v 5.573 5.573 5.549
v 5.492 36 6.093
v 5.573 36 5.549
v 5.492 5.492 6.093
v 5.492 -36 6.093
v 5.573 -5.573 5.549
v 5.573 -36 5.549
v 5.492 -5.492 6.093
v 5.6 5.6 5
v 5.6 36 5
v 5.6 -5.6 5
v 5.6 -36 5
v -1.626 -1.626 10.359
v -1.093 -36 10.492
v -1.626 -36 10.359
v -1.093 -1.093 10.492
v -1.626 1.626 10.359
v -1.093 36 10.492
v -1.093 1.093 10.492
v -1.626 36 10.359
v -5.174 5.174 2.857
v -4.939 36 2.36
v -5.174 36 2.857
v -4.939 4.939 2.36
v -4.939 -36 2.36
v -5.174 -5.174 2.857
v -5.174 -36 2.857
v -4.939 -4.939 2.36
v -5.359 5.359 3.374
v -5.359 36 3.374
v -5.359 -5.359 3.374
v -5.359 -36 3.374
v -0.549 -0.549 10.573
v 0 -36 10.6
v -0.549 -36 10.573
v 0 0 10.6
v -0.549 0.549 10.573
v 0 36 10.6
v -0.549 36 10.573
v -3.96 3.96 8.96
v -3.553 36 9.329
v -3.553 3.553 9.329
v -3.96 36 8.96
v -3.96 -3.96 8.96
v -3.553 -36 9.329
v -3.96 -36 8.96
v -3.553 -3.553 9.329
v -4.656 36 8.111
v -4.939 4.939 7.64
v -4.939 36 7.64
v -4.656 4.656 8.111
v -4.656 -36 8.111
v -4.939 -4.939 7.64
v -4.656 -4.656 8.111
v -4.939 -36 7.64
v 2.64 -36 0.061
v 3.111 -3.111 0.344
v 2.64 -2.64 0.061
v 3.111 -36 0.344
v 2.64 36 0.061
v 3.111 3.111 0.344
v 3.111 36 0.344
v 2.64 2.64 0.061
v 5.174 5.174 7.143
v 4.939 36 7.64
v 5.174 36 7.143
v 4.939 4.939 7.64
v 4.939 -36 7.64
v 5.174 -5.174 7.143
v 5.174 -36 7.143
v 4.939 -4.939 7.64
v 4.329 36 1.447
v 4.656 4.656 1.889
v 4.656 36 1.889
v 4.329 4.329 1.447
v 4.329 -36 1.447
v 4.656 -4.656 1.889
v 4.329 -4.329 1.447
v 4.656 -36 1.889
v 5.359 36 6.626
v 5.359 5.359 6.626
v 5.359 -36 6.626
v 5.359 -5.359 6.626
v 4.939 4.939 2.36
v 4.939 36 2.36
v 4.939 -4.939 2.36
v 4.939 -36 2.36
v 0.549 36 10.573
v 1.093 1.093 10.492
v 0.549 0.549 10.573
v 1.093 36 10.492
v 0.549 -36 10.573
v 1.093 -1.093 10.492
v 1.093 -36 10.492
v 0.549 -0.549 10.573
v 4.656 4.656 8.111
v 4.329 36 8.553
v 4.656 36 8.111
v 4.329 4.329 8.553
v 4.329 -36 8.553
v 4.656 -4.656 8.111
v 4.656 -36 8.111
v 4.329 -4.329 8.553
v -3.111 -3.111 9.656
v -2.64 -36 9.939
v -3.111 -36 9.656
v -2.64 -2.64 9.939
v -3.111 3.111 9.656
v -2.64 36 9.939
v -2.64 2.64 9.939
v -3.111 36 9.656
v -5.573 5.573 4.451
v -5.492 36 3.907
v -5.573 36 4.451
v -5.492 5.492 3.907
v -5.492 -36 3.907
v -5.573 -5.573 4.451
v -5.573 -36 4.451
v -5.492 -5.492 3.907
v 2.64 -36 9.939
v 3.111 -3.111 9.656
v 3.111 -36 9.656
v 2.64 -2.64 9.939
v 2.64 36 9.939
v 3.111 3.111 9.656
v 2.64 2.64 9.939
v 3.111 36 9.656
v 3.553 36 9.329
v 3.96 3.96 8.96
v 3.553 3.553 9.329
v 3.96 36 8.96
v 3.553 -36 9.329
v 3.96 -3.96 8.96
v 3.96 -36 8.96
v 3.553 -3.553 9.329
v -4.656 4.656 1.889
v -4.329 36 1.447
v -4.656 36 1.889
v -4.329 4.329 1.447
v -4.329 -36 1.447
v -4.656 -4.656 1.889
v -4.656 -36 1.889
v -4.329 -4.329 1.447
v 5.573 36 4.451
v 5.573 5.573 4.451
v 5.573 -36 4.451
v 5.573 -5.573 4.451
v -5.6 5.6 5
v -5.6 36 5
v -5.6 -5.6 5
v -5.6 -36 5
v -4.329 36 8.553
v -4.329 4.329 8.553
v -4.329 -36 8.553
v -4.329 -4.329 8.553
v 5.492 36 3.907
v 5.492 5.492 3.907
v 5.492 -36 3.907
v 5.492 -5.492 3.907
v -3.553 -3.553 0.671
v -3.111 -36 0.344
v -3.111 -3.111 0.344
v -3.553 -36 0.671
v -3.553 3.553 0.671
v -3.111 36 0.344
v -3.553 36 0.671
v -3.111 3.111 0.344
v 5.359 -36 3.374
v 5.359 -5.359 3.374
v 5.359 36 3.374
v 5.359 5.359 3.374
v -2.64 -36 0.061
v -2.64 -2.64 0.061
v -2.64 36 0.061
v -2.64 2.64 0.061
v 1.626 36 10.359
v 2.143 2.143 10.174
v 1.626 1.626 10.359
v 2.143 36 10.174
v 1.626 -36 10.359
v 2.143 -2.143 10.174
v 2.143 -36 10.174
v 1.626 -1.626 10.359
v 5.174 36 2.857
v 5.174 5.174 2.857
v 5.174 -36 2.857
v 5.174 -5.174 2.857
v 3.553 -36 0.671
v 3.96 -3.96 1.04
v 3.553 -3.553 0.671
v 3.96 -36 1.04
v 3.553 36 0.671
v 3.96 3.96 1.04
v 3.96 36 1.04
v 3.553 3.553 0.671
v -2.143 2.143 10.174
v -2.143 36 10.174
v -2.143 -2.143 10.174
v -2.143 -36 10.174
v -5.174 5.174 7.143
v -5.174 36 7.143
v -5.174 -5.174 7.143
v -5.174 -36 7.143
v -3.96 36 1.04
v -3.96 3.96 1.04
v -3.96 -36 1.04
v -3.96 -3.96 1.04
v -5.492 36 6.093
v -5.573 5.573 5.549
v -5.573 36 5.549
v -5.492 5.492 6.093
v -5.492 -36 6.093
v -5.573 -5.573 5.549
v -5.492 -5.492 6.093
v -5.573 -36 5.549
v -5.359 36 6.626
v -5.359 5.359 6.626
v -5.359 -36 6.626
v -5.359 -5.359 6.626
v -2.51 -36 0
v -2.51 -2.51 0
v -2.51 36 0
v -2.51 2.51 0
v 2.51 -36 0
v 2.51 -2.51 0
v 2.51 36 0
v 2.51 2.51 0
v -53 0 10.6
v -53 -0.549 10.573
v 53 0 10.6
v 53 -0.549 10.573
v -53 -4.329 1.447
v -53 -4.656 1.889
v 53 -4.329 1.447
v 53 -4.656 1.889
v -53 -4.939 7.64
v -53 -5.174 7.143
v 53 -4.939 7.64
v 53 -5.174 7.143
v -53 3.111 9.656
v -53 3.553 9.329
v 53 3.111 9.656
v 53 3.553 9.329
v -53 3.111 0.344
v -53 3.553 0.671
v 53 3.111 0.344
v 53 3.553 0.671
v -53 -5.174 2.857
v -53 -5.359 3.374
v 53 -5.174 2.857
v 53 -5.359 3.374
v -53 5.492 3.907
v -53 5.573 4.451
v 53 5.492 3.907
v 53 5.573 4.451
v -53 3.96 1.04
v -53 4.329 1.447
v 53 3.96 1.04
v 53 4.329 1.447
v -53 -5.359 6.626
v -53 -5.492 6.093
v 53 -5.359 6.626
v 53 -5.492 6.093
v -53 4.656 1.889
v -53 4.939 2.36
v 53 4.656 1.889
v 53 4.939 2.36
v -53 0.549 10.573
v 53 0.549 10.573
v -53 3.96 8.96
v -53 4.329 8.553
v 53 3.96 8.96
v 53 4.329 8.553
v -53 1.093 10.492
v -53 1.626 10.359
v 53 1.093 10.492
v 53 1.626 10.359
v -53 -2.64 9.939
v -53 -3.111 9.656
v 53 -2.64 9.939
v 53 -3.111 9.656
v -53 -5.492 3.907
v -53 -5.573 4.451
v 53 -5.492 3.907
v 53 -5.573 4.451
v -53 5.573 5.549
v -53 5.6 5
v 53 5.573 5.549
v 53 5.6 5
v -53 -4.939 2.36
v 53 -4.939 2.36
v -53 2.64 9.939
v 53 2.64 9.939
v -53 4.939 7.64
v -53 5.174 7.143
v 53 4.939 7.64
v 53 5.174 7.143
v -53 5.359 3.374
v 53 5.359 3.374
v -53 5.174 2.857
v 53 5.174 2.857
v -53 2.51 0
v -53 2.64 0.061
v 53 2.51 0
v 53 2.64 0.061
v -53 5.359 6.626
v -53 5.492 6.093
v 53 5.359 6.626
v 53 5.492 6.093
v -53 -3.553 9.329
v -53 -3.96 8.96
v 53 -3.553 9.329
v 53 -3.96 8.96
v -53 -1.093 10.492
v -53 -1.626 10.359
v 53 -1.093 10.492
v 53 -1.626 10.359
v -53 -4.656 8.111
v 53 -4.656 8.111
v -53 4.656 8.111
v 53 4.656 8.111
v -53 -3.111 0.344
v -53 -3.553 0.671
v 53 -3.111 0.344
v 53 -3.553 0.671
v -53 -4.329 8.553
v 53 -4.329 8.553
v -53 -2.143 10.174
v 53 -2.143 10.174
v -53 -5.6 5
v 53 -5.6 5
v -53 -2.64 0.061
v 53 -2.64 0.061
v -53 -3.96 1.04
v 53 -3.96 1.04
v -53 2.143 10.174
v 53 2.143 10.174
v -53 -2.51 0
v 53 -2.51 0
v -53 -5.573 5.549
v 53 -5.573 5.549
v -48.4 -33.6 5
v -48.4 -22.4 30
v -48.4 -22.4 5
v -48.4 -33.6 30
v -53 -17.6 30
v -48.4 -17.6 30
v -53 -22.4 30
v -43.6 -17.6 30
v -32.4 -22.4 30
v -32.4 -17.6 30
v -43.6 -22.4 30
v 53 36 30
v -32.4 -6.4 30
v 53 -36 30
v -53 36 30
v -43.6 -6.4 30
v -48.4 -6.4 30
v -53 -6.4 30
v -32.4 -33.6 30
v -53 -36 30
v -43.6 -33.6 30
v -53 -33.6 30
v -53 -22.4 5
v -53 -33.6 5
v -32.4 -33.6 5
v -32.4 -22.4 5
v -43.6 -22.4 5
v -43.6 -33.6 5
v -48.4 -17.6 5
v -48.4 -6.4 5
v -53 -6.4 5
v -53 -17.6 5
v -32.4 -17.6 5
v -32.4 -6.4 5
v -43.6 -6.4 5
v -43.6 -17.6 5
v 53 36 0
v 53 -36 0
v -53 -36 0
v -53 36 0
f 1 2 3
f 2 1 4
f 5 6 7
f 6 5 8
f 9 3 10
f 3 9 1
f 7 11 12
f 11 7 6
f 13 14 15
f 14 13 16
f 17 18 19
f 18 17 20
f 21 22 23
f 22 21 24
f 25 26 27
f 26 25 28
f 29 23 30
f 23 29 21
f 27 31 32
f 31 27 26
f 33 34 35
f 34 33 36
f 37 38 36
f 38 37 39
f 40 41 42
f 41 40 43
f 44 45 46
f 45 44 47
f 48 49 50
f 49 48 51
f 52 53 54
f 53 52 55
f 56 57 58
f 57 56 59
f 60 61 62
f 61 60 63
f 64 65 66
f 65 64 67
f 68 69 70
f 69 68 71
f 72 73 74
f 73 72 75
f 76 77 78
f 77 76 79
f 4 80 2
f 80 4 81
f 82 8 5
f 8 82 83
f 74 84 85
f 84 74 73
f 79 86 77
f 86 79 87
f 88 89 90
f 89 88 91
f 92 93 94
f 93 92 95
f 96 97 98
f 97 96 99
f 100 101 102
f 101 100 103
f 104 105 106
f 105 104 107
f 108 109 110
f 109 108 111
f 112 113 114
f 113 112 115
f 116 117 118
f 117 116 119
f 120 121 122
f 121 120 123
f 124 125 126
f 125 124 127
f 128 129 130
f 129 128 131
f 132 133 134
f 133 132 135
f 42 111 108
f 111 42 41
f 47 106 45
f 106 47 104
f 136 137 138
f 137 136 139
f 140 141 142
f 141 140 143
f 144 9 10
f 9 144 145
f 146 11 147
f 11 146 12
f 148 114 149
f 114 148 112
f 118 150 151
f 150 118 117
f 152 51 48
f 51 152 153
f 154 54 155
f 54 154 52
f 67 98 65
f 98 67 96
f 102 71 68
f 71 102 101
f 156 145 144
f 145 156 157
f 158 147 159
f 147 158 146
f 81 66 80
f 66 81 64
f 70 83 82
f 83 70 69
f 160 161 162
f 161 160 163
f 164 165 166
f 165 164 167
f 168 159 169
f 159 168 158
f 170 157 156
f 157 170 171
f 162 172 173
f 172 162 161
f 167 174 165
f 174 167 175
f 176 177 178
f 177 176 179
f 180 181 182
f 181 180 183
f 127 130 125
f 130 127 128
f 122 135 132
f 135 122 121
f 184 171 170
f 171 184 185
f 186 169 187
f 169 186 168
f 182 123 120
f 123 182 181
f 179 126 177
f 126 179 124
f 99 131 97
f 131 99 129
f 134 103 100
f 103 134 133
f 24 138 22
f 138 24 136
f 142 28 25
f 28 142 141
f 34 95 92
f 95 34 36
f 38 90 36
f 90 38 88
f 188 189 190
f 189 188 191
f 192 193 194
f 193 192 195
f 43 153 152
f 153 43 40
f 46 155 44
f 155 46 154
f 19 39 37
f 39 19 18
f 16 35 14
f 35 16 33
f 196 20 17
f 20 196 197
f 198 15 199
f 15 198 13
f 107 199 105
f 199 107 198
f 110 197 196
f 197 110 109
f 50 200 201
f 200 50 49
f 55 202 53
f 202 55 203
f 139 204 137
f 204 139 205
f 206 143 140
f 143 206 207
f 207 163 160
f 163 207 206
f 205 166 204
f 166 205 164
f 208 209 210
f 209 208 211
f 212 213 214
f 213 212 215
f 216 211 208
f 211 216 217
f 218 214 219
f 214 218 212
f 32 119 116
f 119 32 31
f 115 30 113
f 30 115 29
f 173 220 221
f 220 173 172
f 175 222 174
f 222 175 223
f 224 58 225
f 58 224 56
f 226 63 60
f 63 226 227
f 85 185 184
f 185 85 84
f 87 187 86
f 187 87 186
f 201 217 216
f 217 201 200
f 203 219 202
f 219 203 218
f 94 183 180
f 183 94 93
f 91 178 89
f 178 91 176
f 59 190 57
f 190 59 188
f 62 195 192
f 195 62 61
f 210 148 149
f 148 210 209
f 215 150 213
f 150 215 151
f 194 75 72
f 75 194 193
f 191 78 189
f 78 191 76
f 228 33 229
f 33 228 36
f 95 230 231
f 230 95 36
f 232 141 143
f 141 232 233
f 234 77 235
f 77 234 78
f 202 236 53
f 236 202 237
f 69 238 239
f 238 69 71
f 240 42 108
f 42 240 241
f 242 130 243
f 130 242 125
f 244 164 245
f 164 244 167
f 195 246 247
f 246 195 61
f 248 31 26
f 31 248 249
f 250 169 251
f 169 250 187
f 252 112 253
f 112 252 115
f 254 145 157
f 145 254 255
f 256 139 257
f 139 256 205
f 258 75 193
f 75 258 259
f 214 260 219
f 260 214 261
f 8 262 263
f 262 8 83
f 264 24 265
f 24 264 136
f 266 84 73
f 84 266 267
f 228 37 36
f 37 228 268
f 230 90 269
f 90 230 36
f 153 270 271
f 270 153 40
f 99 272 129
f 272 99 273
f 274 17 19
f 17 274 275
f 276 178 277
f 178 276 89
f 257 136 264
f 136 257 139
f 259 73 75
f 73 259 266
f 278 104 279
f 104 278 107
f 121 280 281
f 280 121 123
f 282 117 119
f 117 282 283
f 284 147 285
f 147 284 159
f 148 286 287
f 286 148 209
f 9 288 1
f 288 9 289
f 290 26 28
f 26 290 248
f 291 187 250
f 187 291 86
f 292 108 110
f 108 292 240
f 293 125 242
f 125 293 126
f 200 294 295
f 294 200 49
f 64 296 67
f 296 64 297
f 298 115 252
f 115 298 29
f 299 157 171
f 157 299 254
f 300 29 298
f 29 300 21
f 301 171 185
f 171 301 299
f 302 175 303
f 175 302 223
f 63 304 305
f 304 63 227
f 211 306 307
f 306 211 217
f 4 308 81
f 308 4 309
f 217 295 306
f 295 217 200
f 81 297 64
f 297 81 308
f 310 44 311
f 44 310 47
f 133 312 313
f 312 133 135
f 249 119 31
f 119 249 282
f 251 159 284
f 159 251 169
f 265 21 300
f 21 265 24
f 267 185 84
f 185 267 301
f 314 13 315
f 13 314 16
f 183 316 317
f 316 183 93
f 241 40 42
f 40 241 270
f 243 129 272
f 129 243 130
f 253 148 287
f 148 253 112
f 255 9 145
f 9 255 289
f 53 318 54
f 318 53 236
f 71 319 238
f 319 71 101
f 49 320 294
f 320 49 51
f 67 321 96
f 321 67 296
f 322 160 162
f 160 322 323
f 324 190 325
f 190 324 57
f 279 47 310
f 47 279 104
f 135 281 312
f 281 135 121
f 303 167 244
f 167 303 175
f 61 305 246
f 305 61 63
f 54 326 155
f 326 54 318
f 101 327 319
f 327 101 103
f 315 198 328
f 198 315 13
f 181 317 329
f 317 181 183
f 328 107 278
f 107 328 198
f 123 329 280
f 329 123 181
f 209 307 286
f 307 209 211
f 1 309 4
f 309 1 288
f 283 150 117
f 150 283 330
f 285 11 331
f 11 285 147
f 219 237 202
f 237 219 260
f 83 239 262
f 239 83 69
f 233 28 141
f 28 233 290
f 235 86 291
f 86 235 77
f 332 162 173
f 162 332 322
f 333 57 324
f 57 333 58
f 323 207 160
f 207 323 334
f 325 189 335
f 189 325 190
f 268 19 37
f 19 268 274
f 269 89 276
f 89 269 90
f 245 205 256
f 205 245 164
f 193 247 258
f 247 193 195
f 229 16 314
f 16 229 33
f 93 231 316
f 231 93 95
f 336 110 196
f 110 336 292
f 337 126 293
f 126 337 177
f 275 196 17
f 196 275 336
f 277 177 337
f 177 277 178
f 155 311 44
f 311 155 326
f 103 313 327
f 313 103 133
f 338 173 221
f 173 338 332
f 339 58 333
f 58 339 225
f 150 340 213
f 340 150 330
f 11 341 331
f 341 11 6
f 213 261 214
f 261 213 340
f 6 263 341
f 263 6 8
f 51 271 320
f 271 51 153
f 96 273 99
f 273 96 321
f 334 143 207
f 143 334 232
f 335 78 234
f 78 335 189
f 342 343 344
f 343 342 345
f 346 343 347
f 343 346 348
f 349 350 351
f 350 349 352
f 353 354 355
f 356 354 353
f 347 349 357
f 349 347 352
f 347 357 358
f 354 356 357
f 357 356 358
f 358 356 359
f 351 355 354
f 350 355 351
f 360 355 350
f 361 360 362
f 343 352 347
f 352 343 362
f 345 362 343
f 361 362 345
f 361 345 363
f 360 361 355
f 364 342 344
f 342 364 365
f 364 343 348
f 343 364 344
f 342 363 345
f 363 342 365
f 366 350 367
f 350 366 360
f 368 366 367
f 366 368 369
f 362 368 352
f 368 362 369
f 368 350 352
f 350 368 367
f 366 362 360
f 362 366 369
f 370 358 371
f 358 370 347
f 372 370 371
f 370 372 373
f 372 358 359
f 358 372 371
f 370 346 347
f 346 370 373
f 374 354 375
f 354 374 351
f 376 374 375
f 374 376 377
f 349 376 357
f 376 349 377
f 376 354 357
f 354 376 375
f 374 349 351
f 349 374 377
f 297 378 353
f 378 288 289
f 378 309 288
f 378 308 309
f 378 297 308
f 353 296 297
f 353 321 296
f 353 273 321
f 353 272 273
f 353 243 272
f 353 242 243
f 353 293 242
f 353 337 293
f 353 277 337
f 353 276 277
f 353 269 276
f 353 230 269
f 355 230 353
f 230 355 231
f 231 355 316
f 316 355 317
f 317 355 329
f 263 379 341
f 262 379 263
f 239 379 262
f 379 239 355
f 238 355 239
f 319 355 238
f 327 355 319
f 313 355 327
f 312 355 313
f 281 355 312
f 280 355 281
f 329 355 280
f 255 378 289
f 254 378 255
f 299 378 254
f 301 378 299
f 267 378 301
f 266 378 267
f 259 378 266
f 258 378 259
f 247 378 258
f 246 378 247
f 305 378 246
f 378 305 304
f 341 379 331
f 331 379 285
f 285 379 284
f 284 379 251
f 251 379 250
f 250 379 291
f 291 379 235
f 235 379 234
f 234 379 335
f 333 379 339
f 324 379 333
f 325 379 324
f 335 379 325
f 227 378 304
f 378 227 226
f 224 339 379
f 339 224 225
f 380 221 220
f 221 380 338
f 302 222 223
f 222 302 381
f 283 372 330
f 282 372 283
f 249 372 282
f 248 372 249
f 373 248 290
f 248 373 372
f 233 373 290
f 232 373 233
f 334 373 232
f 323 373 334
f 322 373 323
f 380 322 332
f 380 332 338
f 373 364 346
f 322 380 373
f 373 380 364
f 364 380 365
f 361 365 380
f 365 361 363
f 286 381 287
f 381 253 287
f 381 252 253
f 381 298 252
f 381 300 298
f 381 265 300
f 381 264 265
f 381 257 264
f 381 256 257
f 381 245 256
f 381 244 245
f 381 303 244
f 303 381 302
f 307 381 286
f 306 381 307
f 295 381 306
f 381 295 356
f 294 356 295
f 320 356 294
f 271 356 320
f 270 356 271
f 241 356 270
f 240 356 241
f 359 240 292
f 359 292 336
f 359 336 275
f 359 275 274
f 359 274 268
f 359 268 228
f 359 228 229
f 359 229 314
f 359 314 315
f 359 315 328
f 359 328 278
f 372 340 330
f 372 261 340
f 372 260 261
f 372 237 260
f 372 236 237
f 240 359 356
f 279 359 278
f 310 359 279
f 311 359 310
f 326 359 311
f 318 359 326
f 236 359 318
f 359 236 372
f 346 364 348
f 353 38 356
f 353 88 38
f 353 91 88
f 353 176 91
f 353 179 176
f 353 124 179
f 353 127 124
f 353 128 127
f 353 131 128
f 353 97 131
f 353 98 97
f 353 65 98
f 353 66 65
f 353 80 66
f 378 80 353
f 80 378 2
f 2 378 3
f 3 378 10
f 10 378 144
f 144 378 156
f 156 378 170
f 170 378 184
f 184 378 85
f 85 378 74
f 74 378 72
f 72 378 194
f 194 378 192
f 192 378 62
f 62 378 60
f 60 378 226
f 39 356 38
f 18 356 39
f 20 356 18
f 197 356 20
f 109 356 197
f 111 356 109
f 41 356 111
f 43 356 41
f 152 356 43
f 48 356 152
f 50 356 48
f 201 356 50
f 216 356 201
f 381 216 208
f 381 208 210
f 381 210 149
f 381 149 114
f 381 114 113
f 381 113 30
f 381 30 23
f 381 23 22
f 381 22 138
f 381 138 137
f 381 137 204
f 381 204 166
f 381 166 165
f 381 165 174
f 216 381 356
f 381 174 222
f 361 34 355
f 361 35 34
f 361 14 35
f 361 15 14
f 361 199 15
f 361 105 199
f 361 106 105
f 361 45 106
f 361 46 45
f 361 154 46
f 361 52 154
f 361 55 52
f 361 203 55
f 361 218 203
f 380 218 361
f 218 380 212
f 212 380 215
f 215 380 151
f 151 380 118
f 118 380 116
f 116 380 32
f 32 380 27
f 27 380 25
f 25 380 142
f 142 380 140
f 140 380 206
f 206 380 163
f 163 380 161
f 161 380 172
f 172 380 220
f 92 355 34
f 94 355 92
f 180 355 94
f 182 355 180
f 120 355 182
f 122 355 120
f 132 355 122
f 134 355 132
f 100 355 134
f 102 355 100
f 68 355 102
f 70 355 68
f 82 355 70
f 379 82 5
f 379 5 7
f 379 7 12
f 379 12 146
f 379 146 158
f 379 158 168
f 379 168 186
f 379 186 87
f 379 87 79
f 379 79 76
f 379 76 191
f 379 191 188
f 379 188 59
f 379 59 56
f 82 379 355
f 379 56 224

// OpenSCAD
// Built by bench/smallmodels/features/compiler.py from a list of features.
$fn = 64;
difference() {
  union() {
    translate([0, 0, 0]) translate([-53, -36, 0]) cube([106, 72, 30]);
  }
  union() {
    translate([0, 0, 5]) rotate([0, 0, 0]) rotate([90, 0, 0]) cylinder(d = 11.2, h = 1120, center = true);
    translate([0, 0, 5]) rotate([0, 0, 0]) rotate([0, 90, 0]) cylinder(d = 11.2, h = 1120, center = true);
    translate([-118, -60, 5]) rotate([0, 0, 0]) translate([-5.6, -5.6, 0]) cube([11.2, 11.2, 25]);
    translate([-102, -60, 5]) rotate([0, 0, 0]) translate([-5.6, -5.6, 0]) cube([11.2, 11.2, 25]);
    translate([-86, -60, 5]) rotate([0, 0, 0]) translate([-5.6, -5.6, 0]) cube([11.2, 11.2, 25]);
    translate([-70, -60, 5]) rotate([0, 0, 0]) translate([-5.6, -5.6, 0]) cube([11.2, 11.2, 25]);
    translate([-54, -60, 5]) rotate([0, 0, 0]) translate([-5.6, -5.6, 0]) cube([11.2, 11.2, 25]);
    translate([-38, -60, 5]) rotate([0, 0, 0]) translate([-5.6, -5.6, 0]) cube([11.2, 11.2, 25]);
    translate([-118, -44, 5]) rotate([0, 0, 0]) translate([-5.6, -5.6, 0]) cube([11.2, 11.2, 25]);
    translate([-102, -44, 5]) rotate([0, 0, 0]) translate([-5.6, -5.6, 0]) cube([11.2, 11.2, 25]);
    translate([-86, -44, 5]) rotate([0, 0, 0]) translate([-5.6, -5.6, 0]) cube([11.2, 11.2, 25]);
    translate([-70, -44, 5]) rotate([0, 0, 0]) translate([-5.6, -5.6, 0]) cube([11.2, 11.2, 25]);
    translate([-54, -44, 5]) rotate([0, 0, 0]) translate([-5.6, -5.6, 0]) cube([11.2, 11.2, 25]);
    translate([-38, -44, 5]) rotate([0, 0, 0]) translate([-5.6, -5.6, 0]) cube([11.2, 11.2, 25]);
    translate([-118, -28, 5]) rotate([0, 0, 0]) translate([-5.6, -5.6, 0]) cube([11.2, 11.2, 25]);
    translate([-102, -28, 5]) rotate([0, 0, 0]) translate([-5.6, -5.6, 0]) cube([11.2, 11.2, 25]);
    translate([-86, -28, 5]) rotate([0, 0, 0]) translate([-5.6, -5.6, 0]) cube([11.2, 11.2, 25]);
    translate([-70, -28, 5]) rotate([0, 0, 0]) translate([-5.6, -5.6, 0]) cube([11.2, 11.2, 25]);
    translate([-54, -28, 5]) rotate([0, 0, 0]) translate([-5.6, -5.6, 0]) cube([11.2, 11.2, 25]);
    translate([-38, -28, 5]) rotate([0, 0, 0]) translate([-5.6, -5.6, 0]) cube([11.2, 11.2, 25]);
    translate([-118, -12, 5]) rotate([0, 0, 0]) translate([-5.6, -5.6, 0]) cube([11.2, 11.2, 25]);
    translate([-102, -12, 5]) rotate([0, 0, 0]) translate([-5.6, -5.6, 0]) cube([11.2, 11.2, 25]);
    translate([-86, -12, 5]) rotate([0, 0, 0]) translate([-5.6, -5.6, 0]) cube([11.2, 11.2, 25]);
    translate([-70, -12, 5]) rotate([0, 0, 0]) translate([-5.6, -5.6, 0]) cube([11.2, 11.2, 25]);
    translate([-54, -12, 5]) rotate([0, 0, 0]) translate([-5.6, -5.6, 0]) cube([11.2, 11.2, 25]);
    translate([-38, -12, 5]) rotate([0, 0, 0]) translate([-5.6, -5.6, 0]) cube([11.2, 11.2, 25]);
  }
}
